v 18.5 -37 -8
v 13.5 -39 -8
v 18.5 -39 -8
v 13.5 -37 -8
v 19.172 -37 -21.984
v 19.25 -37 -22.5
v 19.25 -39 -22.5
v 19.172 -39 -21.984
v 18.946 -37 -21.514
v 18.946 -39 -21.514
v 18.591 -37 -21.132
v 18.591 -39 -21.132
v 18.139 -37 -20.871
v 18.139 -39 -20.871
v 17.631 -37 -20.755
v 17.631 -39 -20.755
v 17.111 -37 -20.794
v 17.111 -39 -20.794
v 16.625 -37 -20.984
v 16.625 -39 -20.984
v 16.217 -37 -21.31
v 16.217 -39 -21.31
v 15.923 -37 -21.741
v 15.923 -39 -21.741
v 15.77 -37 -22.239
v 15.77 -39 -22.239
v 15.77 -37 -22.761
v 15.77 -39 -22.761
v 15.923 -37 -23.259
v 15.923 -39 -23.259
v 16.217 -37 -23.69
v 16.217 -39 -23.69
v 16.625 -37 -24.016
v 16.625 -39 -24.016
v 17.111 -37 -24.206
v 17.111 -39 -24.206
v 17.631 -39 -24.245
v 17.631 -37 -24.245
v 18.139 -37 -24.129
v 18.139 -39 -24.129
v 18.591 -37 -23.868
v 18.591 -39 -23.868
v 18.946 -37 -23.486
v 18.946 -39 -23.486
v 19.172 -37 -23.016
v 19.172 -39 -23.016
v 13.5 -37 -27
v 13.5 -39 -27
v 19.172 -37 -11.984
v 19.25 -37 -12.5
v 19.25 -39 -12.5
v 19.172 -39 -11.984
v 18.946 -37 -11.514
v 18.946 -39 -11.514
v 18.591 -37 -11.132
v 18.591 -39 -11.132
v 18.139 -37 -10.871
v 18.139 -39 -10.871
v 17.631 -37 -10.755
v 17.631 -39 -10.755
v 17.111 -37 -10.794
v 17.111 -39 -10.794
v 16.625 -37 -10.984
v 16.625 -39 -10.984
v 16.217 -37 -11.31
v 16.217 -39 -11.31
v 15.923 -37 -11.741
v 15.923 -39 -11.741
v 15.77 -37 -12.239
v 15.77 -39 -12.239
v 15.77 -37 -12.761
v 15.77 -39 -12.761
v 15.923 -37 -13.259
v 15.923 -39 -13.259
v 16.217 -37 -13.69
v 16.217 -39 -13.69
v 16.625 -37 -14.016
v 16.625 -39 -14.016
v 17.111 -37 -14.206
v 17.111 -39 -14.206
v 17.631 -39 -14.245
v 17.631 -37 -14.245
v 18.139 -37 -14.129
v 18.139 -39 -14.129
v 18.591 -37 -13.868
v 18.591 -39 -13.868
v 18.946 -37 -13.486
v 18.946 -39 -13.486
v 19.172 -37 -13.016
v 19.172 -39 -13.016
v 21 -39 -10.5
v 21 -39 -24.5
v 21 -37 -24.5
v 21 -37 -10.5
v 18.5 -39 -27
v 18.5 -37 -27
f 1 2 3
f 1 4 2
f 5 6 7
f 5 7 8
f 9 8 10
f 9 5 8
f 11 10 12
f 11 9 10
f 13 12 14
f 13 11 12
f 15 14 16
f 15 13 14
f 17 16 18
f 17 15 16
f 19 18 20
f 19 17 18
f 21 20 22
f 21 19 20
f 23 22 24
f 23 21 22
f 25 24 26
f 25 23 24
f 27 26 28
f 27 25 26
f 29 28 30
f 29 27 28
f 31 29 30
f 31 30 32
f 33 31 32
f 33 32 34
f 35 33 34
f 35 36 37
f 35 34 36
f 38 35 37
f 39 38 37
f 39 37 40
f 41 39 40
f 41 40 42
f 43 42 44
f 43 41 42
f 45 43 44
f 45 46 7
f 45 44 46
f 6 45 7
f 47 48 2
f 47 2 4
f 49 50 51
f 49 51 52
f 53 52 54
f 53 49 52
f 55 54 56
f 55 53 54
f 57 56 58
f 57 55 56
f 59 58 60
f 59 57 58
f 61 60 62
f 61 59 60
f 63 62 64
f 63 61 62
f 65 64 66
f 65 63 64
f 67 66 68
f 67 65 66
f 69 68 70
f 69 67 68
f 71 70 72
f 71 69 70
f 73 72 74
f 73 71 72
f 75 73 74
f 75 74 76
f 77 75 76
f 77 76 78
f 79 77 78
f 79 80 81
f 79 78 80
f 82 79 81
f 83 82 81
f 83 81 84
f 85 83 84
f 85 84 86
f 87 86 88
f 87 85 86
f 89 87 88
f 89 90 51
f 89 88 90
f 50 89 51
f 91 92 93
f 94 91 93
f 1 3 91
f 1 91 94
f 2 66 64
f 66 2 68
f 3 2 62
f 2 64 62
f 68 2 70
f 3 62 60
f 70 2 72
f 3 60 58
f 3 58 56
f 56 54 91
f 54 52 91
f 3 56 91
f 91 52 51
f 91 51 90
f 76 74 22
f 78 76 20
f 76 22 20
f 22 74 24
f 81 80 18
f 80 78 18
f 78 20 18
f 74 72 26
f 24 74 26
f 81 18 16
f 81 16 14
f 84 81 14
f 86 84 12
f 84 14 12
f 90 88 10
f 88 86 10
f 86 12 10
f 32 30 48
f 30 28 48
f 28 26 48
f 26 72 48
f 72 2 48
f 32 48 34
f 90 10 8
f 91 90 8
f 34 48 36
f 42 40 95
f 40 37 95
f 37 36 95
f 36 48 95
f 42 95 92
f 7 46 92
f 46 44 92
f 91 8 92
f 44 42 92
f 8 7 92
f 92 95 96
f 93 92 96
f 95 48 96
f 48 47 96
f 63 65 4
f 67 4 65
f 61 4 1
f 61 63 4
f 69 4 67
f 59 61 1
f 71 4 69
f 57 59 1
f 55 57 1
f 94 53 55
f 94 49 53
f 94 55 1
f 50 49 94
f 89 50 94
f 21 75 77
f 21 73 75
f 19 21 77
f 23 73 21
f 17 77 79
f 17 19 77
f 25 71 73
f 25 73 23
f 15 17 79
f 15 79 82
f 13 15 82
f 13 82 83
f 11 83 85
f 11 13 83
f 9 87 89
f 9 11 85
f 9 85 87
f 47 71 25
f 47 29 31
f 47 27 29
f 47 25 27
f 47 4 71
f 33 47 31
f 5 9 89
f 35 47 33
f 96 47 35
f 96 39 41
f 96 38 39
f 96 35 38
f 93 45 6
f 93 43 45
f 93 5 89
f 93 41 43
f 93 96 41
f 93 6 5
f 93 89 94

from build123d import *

# Parameters (mm, degrees)
CYLINDER074_R          = 1.75
CYLINDER074_DEPTH      = 30
CYLINDER074_ROLL_ANGLE = 90
CYLINDER073_R          = 1.75
CYLINDER073_DEPTH      = 30
CYLINDER073_ROLL_ANGLE = 90
BOX067_W               = 7.5
BOX067_H               = 2
BOX067_DEPTH           = 19
CHAMFER012_SIZE        = 2.5


with BuildPart() as cylinder186:
    # Cylinder074 → Cylinder074 (new body)
    with BuildSketch(Plane.XY):
        Circle(CYLINDER074_R)
    extrude(amount=CYLINDER074_DEPTH)


with BuildPart() as cylinder186_1:
    # Cylinder074 roll: moved
    add(cylinder186.part.rotate(Axis((0, 0, 0), (1, 0, 0)), CYLINDER074_ROLL_ANGLE))


with BuildPart() as cylinder186_2:
    # Cylinder074 placement: moved
    add(cylinder186_1.part.moved(Location((17.5, -21, -22.5))))


with BuildPart() as fusion060:
    # Cylinder073 → Cylinder073 (new body)
    with BuildSketch(Plane.XY):
        Circle(CYLINDER073_R)
    extrude(amount=CYLINDER073_DEPTH)


with BuildPart() as fusion060_1:
    # Cylinder073 roll: moved
    add(fusion060.part.rotate(Axis((0, 0, 0), (1, 0, 0)), CYLINDER073_ROLL_ANGLE))


with BuildPart() as fusion060_2:
    # Cylinder073 placement: moved
    add(fusion060_1.part.moved(Location((17.5, -21, -12.5))))

    # Fusion060: union Cylinder186
    add(cylinder186_2.part)


with BuildPart() as spacer:
    # Box067 → Box067 (new body)
    with BuildSketch(Plane(origin=(13.5, -39, -27), x_dir=(1, 0, 0), z_dir=(0, 0, 1))):
        with Locations((3.75, 1)):
            Rectangle(BOX067_W, BOX067_H)
    extrude(amount=BOX067_DEPTH)

    # Chamfer012
    chamfer012_edges = [spacer.edges().sort_by_distance(p)[0] for p in [
        (21, -38, -8),
        (21, -38, -27),
    ]]
    chamfer(chamfer012_edges, length=CHAMFER012_SIZE)

    # Cut094: cut Fusion060
    add(fusion060_2.part, mode=Mode.SUBTRACT)


solid = spacer.part
